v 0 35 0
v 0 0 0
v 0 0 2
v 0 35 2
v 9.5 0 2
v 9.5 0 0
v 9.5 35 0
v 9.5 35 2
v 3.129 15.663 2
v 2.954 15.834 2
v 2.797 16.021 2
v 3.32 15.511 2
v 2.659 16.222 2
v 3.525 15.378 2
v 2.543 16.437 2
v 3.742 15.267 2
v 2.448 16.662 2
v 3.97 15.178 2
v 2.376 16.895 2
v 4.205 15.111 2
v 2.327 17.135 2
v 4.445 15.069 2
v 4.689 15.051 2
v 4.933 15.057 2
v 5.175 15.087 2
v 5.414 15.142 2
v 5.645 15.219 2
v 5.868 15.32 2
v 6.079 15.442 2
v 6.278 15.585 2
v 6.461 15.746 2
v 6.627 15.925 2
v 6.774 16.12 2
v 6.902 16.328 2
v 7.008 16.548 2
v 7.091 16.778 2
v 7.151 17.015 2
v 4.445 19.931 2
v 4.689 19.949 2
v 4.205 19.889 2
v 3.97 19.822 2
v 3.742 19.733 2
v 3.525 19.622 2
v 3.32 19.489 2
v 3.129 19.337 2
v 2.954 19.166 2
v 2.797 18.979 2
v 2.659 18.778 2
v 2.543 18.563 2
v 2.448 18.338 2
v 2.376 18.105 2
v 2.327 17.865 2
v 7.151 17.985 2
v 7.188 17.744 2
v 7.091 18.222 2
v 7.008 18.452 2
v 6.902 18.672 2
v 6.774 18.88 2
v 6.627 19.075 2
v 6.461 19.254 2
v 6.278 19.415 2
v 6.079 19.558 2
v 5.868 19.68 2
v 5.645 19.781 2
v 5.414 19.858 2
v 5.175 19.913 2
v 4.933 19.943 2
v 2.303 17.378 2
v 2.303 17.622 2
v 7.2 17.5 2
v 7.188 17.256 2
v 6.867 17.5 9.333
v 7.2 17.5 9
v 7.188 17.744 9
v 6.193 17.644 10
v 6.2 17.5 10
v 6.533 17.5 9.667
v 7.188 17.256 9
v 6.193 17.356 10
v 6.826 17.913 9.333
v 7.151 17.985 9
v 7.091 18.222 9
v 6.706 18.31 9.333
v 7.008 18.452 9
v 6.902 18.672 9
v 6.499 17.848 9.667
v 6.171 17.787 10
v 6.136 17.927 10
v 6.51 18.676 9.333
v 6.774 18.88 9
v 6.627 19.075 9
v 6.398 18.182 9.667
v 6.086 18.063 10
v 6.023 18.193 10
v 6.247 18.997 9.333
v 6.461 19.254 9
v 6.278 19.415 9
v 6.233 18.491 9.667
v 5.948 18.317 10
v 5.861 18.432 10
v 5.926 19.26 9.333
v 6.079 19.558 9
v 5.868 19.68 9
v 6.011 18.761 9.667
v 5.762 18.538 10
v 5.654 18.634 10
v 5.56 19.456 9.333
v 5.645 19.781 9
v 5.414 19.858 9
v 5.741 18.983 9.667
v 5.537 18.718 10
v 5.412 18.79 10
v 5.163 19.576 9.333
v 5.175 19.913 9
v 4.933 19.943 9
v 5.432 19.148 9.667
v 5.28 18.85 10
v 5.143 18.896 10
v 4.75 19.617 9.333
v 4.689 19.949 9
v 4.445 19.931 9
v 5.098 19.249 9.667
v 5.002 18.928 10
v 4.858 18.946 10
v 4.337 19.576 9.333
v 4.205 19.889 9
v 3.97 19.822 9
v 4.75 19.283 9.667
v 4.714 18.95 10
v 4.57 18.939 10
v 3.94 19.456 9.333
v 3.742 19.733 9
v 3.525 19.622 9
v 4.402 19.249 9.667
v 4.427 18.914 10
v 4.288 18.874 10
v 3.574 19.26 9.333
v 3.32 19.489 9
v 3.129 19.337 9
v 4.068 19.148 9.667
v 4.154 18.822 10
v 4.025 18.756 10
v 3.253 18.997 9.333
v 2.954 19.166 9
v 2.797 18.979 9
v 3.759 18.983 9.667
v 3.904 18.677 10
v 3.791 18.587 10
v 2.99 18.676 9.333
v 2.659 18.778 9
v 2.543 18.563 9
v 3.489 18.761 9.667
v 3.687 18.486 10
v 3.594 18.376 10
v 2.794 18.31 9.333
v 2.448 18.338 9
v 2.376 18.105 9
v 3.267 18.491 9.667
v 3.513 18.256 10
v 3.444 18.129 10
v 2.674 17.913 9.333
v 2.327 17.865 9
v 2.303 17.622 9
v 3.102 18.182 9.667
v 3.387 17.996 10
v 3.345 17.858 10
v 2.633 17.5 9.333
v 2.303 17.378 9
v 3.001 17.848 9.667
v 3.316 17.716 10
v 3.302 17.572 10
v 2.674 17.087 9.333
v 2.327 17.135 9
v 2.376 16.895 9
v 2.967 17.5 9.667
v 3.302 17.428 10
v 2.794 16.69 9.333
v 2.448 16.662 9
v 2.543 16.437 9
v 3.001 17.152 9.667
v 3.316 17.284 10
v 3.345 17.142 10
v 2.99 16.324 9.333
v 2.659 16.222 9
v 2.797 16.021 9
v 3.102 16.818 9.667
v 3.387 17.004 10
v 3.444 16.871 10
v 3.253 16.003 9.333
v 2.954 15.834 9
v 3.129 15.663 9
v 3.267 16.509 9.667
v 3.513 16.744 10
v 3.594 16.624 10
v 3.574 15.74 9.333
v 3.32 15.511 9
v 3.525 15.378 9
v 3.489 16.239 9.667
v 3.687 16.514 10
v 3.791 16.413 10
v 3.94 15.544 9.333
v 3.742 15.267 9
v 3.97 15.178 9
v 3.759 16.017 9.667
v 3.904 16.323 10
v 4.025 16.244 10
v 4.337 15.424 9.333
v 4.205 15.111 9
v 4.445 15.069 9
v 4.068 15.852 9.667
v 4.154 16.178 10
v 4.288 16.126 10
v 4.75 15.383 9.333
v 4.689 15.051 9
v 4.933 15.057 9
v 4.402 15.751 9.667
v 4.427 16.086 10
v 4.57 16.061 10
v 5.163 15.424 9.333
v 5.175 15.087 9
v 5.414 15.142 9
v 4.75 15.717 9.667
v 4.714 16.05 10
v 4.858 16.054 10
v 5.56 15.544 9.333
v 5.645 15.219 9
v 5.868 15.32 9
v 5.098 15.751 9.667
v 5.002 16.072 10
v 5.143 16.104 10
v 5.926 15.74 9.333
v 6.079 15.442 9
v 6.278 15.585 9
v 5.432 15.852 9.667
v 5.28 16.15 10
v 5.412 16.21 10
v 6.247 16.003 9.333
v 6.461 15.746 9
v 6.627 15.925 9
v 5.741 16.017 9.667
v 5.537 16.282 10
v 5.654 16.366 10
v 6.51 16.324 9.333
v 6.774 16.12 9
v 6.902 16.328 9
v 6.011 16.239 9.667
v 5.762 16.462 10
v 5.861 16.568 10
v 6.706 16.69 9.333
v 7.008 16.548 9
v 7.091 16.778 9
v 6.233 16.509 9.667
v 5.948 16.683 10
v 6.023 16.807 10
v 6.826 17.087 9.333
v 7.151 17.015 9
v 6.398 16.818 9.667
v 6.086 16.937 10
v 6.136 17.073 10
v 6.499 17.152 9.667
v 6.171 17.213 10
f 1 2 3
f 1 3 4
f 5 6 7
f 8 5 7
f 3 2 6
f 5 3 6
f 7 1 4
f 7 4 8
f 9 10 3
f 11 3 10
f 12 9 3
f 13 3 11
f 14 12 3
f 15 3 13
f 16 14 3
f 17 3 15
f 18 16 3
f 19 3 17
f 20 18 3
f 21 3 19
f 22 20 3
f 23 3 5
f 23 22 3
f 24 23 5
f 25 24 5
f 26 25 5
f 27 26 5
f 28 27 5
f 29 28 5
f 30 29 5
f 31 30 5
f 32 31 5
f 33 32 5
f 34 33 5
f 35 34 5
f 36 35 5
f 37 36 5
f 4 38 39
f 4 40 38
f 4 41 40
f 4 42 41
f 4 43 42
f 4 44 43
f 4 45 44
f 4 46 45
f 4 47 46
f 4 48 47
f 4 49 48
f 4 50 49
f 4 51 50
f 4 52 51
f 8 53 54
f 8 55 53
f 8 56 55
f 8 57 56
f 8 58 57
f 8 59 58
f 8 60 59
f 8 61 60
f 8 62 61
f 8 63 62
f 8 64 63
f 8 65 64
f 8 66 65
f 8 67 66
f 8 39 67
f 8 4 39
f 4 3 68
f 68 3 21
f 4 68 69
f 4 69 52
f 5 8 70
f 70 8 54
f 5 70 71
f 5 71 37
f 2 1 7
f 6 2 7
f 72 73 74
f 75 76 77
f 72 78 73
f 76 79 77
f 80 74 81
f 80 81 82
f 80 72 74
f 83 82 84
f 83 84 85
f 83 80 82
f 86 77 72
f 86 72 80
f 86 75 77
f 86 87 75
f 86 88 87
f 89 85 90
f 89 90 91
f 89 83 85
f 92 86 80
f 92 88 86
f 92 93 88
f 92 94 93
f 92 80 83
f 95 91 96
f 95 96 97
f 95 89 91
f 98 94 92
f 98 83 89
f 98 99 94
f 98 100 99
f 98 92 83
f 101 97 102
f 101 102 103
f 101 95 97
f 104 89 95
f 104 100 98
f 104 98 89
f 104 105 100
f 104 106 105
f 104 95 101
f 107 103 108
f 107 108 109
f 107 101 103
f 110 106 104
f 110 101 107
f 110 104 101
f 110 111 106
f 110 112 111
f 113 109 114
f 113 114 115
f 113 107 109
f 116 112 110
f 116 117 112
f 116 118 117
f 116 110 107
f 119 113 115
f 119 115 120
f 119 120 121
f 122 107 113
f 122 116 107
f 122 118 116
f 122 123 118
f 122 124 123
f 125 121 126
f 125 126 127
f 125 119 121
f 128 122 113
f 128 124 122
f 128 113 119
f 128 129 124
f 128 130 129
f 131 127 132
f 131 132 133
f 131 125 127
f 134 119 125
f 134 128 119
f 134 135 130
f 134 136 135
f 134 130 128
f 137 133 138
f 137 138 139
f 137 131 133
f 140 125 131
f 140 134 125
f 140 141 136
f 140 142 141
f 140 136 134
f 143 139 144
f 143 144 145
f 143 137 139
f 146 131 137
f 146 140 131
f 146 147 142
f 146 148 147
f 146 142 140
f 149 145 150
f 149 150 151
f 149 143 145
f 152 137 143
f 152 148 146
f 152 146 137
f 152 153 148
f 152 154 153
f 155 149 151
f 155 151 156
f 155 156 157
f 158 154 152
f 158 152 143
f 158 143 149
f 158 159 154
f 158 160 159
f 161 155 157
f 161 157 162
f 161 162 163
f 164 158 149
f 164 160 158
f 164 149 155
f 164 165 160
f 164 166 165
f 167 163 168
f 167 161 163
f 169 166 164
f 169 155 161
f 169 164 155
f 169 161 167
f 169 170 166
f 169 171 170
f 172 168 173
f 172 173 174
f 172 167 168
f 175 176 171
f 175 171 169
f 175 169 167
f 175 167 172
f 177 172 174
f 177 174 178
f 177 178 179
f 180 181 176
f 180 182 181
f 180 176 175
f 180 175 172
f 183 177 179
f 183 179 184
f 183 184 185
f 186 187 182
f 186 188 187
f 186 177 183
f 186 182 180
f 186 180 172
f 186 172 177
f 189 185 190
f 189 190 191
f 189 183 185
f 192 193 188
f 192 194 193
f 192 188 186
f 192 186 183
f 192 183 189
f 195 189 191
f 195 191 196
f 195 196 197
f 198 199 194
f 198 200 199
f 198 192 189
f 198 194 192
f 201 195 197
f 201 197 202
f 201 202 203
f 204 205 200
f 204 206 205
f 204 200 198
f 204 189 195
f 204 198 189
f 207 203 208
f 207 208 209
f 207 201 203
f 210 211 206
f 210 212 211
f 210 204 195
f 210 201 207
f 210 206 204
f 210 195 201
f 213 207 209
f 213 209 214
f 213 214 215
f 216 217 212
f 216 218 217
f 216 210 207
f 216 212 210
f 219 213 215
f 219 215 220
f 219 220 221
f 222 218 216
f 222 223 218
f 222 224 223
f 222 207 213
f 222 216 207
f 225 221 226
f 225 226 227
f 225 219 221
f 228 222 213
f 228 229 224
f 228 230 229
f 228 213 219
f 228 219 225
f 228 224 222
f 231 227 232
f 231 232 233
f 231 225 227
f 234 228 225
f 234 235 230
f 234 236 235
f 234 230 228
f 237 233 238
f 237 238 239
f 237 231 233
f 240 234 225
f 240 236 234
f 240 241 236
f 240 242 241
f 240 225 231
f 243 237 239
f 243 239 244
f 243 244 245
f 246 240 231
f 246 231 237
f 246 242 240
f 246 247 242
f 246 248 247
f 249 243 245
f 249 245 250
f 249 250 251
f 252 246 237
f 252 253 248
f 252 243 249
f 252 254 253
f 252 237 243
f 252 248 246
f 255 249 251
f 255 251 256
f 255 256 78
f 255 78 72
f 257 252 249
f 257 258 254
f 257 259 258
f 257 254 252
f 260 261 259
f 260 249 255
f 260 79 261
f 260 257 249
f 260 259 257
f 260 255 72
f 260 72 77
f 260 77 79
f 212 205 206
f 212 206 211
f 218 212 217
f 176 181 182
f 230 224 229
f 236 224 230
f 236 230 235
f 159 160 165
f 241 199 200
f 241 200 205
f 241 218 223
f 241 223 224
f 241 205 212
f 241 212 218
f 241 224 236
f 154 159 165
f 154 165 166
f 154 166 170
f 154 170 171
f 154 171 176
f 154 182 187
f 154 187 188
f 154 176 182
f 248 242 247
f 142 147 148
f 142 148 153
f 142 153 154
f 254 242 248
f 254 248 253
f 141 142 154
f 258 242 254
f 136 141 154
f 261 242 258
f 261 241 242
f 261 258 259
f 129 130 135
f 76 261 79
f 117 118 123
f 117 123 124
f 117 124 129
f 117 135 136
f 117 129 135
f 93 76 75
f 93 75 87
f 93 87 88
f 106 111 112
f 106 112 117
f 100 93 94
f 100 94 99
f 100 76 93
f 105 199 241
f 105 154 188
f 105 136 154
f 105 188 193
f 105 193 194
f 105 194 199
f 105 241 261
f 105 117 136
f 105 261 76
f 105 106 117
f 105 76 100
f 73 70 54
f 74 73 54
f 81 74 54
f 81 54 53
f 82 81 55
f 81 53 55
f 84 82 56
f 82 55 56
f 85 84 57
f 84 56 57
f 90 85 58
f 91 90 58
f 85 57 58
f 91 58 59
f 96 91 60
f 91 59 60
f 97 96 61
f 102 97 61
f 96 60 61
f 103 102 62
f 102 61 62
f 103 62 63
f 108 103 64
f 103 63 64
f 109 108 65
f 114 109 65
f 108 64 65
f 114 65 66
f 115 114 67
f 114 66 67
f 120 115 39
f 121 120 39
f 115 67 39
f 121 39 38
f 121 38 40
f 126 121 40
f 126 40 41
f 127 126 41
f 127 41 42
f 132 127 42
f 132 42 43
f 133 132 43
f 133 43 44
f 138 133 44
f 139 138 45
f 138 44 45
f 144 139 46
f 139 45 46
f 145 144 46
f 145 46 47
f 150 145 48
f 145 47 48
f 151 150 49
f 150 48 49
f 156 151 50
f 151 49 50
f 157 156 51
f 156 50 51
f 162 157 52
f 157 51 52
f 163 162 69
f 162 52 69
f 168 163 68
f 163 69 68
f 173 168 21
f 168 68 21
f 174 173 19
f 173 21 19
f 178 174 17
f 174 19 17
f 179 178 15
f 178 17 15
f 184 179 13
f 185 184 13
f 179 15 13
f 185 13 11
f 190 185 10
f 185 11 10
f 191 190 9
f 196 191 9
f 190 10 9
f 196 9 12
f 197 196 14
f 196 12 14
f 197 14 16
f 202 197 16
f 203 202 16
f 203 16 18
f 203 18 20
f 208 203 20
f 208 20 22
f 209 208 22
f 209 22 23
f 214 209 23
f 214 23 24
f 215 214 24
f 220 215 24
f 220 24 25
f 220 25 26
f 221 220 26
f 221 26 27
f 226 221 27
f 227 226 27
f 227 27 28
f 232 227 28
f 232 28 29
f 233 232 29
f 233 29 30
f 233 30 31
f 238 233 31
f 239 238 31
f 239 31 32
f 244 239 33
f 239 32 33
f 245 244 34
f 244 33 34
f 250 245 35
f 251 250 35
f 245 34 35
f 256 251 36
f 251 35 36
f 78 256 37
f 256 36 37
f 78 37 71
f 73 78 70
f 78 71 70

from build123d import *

# Parameters (mm, degrees)
F0_W     = 9.5
F0_H     = 35
F1_DEPTH = 2
F2_R     = 2.45
F3_DEPTH = 8
F4_SIZE  = 1


with BuildPart() as f1:
    # F0 (on Top) → F1 (new body)
    with BuildSketch(Plane.XY):
        with Locations((4.75, 17.5)):
            Rectangle(F0_W, F0_H)
    extrude(amount=F1_DEPTH)

    # F2 (on face) → F3 (join)
    with BuildSketch(Plane.XY.offset(2)):
        with Locations((4.75, 17.5)):
            Circle(F2_R)
    extrude(amount=F3_DEPTH)

    # F4
    f4_edges = [f1.edges().sort_by_distance(p)[0] for p in [
        (2.3, 17.5, 10),
    ]]
    chamfer(f4_edges, length=F4_SIZE)


solid = f1.part
